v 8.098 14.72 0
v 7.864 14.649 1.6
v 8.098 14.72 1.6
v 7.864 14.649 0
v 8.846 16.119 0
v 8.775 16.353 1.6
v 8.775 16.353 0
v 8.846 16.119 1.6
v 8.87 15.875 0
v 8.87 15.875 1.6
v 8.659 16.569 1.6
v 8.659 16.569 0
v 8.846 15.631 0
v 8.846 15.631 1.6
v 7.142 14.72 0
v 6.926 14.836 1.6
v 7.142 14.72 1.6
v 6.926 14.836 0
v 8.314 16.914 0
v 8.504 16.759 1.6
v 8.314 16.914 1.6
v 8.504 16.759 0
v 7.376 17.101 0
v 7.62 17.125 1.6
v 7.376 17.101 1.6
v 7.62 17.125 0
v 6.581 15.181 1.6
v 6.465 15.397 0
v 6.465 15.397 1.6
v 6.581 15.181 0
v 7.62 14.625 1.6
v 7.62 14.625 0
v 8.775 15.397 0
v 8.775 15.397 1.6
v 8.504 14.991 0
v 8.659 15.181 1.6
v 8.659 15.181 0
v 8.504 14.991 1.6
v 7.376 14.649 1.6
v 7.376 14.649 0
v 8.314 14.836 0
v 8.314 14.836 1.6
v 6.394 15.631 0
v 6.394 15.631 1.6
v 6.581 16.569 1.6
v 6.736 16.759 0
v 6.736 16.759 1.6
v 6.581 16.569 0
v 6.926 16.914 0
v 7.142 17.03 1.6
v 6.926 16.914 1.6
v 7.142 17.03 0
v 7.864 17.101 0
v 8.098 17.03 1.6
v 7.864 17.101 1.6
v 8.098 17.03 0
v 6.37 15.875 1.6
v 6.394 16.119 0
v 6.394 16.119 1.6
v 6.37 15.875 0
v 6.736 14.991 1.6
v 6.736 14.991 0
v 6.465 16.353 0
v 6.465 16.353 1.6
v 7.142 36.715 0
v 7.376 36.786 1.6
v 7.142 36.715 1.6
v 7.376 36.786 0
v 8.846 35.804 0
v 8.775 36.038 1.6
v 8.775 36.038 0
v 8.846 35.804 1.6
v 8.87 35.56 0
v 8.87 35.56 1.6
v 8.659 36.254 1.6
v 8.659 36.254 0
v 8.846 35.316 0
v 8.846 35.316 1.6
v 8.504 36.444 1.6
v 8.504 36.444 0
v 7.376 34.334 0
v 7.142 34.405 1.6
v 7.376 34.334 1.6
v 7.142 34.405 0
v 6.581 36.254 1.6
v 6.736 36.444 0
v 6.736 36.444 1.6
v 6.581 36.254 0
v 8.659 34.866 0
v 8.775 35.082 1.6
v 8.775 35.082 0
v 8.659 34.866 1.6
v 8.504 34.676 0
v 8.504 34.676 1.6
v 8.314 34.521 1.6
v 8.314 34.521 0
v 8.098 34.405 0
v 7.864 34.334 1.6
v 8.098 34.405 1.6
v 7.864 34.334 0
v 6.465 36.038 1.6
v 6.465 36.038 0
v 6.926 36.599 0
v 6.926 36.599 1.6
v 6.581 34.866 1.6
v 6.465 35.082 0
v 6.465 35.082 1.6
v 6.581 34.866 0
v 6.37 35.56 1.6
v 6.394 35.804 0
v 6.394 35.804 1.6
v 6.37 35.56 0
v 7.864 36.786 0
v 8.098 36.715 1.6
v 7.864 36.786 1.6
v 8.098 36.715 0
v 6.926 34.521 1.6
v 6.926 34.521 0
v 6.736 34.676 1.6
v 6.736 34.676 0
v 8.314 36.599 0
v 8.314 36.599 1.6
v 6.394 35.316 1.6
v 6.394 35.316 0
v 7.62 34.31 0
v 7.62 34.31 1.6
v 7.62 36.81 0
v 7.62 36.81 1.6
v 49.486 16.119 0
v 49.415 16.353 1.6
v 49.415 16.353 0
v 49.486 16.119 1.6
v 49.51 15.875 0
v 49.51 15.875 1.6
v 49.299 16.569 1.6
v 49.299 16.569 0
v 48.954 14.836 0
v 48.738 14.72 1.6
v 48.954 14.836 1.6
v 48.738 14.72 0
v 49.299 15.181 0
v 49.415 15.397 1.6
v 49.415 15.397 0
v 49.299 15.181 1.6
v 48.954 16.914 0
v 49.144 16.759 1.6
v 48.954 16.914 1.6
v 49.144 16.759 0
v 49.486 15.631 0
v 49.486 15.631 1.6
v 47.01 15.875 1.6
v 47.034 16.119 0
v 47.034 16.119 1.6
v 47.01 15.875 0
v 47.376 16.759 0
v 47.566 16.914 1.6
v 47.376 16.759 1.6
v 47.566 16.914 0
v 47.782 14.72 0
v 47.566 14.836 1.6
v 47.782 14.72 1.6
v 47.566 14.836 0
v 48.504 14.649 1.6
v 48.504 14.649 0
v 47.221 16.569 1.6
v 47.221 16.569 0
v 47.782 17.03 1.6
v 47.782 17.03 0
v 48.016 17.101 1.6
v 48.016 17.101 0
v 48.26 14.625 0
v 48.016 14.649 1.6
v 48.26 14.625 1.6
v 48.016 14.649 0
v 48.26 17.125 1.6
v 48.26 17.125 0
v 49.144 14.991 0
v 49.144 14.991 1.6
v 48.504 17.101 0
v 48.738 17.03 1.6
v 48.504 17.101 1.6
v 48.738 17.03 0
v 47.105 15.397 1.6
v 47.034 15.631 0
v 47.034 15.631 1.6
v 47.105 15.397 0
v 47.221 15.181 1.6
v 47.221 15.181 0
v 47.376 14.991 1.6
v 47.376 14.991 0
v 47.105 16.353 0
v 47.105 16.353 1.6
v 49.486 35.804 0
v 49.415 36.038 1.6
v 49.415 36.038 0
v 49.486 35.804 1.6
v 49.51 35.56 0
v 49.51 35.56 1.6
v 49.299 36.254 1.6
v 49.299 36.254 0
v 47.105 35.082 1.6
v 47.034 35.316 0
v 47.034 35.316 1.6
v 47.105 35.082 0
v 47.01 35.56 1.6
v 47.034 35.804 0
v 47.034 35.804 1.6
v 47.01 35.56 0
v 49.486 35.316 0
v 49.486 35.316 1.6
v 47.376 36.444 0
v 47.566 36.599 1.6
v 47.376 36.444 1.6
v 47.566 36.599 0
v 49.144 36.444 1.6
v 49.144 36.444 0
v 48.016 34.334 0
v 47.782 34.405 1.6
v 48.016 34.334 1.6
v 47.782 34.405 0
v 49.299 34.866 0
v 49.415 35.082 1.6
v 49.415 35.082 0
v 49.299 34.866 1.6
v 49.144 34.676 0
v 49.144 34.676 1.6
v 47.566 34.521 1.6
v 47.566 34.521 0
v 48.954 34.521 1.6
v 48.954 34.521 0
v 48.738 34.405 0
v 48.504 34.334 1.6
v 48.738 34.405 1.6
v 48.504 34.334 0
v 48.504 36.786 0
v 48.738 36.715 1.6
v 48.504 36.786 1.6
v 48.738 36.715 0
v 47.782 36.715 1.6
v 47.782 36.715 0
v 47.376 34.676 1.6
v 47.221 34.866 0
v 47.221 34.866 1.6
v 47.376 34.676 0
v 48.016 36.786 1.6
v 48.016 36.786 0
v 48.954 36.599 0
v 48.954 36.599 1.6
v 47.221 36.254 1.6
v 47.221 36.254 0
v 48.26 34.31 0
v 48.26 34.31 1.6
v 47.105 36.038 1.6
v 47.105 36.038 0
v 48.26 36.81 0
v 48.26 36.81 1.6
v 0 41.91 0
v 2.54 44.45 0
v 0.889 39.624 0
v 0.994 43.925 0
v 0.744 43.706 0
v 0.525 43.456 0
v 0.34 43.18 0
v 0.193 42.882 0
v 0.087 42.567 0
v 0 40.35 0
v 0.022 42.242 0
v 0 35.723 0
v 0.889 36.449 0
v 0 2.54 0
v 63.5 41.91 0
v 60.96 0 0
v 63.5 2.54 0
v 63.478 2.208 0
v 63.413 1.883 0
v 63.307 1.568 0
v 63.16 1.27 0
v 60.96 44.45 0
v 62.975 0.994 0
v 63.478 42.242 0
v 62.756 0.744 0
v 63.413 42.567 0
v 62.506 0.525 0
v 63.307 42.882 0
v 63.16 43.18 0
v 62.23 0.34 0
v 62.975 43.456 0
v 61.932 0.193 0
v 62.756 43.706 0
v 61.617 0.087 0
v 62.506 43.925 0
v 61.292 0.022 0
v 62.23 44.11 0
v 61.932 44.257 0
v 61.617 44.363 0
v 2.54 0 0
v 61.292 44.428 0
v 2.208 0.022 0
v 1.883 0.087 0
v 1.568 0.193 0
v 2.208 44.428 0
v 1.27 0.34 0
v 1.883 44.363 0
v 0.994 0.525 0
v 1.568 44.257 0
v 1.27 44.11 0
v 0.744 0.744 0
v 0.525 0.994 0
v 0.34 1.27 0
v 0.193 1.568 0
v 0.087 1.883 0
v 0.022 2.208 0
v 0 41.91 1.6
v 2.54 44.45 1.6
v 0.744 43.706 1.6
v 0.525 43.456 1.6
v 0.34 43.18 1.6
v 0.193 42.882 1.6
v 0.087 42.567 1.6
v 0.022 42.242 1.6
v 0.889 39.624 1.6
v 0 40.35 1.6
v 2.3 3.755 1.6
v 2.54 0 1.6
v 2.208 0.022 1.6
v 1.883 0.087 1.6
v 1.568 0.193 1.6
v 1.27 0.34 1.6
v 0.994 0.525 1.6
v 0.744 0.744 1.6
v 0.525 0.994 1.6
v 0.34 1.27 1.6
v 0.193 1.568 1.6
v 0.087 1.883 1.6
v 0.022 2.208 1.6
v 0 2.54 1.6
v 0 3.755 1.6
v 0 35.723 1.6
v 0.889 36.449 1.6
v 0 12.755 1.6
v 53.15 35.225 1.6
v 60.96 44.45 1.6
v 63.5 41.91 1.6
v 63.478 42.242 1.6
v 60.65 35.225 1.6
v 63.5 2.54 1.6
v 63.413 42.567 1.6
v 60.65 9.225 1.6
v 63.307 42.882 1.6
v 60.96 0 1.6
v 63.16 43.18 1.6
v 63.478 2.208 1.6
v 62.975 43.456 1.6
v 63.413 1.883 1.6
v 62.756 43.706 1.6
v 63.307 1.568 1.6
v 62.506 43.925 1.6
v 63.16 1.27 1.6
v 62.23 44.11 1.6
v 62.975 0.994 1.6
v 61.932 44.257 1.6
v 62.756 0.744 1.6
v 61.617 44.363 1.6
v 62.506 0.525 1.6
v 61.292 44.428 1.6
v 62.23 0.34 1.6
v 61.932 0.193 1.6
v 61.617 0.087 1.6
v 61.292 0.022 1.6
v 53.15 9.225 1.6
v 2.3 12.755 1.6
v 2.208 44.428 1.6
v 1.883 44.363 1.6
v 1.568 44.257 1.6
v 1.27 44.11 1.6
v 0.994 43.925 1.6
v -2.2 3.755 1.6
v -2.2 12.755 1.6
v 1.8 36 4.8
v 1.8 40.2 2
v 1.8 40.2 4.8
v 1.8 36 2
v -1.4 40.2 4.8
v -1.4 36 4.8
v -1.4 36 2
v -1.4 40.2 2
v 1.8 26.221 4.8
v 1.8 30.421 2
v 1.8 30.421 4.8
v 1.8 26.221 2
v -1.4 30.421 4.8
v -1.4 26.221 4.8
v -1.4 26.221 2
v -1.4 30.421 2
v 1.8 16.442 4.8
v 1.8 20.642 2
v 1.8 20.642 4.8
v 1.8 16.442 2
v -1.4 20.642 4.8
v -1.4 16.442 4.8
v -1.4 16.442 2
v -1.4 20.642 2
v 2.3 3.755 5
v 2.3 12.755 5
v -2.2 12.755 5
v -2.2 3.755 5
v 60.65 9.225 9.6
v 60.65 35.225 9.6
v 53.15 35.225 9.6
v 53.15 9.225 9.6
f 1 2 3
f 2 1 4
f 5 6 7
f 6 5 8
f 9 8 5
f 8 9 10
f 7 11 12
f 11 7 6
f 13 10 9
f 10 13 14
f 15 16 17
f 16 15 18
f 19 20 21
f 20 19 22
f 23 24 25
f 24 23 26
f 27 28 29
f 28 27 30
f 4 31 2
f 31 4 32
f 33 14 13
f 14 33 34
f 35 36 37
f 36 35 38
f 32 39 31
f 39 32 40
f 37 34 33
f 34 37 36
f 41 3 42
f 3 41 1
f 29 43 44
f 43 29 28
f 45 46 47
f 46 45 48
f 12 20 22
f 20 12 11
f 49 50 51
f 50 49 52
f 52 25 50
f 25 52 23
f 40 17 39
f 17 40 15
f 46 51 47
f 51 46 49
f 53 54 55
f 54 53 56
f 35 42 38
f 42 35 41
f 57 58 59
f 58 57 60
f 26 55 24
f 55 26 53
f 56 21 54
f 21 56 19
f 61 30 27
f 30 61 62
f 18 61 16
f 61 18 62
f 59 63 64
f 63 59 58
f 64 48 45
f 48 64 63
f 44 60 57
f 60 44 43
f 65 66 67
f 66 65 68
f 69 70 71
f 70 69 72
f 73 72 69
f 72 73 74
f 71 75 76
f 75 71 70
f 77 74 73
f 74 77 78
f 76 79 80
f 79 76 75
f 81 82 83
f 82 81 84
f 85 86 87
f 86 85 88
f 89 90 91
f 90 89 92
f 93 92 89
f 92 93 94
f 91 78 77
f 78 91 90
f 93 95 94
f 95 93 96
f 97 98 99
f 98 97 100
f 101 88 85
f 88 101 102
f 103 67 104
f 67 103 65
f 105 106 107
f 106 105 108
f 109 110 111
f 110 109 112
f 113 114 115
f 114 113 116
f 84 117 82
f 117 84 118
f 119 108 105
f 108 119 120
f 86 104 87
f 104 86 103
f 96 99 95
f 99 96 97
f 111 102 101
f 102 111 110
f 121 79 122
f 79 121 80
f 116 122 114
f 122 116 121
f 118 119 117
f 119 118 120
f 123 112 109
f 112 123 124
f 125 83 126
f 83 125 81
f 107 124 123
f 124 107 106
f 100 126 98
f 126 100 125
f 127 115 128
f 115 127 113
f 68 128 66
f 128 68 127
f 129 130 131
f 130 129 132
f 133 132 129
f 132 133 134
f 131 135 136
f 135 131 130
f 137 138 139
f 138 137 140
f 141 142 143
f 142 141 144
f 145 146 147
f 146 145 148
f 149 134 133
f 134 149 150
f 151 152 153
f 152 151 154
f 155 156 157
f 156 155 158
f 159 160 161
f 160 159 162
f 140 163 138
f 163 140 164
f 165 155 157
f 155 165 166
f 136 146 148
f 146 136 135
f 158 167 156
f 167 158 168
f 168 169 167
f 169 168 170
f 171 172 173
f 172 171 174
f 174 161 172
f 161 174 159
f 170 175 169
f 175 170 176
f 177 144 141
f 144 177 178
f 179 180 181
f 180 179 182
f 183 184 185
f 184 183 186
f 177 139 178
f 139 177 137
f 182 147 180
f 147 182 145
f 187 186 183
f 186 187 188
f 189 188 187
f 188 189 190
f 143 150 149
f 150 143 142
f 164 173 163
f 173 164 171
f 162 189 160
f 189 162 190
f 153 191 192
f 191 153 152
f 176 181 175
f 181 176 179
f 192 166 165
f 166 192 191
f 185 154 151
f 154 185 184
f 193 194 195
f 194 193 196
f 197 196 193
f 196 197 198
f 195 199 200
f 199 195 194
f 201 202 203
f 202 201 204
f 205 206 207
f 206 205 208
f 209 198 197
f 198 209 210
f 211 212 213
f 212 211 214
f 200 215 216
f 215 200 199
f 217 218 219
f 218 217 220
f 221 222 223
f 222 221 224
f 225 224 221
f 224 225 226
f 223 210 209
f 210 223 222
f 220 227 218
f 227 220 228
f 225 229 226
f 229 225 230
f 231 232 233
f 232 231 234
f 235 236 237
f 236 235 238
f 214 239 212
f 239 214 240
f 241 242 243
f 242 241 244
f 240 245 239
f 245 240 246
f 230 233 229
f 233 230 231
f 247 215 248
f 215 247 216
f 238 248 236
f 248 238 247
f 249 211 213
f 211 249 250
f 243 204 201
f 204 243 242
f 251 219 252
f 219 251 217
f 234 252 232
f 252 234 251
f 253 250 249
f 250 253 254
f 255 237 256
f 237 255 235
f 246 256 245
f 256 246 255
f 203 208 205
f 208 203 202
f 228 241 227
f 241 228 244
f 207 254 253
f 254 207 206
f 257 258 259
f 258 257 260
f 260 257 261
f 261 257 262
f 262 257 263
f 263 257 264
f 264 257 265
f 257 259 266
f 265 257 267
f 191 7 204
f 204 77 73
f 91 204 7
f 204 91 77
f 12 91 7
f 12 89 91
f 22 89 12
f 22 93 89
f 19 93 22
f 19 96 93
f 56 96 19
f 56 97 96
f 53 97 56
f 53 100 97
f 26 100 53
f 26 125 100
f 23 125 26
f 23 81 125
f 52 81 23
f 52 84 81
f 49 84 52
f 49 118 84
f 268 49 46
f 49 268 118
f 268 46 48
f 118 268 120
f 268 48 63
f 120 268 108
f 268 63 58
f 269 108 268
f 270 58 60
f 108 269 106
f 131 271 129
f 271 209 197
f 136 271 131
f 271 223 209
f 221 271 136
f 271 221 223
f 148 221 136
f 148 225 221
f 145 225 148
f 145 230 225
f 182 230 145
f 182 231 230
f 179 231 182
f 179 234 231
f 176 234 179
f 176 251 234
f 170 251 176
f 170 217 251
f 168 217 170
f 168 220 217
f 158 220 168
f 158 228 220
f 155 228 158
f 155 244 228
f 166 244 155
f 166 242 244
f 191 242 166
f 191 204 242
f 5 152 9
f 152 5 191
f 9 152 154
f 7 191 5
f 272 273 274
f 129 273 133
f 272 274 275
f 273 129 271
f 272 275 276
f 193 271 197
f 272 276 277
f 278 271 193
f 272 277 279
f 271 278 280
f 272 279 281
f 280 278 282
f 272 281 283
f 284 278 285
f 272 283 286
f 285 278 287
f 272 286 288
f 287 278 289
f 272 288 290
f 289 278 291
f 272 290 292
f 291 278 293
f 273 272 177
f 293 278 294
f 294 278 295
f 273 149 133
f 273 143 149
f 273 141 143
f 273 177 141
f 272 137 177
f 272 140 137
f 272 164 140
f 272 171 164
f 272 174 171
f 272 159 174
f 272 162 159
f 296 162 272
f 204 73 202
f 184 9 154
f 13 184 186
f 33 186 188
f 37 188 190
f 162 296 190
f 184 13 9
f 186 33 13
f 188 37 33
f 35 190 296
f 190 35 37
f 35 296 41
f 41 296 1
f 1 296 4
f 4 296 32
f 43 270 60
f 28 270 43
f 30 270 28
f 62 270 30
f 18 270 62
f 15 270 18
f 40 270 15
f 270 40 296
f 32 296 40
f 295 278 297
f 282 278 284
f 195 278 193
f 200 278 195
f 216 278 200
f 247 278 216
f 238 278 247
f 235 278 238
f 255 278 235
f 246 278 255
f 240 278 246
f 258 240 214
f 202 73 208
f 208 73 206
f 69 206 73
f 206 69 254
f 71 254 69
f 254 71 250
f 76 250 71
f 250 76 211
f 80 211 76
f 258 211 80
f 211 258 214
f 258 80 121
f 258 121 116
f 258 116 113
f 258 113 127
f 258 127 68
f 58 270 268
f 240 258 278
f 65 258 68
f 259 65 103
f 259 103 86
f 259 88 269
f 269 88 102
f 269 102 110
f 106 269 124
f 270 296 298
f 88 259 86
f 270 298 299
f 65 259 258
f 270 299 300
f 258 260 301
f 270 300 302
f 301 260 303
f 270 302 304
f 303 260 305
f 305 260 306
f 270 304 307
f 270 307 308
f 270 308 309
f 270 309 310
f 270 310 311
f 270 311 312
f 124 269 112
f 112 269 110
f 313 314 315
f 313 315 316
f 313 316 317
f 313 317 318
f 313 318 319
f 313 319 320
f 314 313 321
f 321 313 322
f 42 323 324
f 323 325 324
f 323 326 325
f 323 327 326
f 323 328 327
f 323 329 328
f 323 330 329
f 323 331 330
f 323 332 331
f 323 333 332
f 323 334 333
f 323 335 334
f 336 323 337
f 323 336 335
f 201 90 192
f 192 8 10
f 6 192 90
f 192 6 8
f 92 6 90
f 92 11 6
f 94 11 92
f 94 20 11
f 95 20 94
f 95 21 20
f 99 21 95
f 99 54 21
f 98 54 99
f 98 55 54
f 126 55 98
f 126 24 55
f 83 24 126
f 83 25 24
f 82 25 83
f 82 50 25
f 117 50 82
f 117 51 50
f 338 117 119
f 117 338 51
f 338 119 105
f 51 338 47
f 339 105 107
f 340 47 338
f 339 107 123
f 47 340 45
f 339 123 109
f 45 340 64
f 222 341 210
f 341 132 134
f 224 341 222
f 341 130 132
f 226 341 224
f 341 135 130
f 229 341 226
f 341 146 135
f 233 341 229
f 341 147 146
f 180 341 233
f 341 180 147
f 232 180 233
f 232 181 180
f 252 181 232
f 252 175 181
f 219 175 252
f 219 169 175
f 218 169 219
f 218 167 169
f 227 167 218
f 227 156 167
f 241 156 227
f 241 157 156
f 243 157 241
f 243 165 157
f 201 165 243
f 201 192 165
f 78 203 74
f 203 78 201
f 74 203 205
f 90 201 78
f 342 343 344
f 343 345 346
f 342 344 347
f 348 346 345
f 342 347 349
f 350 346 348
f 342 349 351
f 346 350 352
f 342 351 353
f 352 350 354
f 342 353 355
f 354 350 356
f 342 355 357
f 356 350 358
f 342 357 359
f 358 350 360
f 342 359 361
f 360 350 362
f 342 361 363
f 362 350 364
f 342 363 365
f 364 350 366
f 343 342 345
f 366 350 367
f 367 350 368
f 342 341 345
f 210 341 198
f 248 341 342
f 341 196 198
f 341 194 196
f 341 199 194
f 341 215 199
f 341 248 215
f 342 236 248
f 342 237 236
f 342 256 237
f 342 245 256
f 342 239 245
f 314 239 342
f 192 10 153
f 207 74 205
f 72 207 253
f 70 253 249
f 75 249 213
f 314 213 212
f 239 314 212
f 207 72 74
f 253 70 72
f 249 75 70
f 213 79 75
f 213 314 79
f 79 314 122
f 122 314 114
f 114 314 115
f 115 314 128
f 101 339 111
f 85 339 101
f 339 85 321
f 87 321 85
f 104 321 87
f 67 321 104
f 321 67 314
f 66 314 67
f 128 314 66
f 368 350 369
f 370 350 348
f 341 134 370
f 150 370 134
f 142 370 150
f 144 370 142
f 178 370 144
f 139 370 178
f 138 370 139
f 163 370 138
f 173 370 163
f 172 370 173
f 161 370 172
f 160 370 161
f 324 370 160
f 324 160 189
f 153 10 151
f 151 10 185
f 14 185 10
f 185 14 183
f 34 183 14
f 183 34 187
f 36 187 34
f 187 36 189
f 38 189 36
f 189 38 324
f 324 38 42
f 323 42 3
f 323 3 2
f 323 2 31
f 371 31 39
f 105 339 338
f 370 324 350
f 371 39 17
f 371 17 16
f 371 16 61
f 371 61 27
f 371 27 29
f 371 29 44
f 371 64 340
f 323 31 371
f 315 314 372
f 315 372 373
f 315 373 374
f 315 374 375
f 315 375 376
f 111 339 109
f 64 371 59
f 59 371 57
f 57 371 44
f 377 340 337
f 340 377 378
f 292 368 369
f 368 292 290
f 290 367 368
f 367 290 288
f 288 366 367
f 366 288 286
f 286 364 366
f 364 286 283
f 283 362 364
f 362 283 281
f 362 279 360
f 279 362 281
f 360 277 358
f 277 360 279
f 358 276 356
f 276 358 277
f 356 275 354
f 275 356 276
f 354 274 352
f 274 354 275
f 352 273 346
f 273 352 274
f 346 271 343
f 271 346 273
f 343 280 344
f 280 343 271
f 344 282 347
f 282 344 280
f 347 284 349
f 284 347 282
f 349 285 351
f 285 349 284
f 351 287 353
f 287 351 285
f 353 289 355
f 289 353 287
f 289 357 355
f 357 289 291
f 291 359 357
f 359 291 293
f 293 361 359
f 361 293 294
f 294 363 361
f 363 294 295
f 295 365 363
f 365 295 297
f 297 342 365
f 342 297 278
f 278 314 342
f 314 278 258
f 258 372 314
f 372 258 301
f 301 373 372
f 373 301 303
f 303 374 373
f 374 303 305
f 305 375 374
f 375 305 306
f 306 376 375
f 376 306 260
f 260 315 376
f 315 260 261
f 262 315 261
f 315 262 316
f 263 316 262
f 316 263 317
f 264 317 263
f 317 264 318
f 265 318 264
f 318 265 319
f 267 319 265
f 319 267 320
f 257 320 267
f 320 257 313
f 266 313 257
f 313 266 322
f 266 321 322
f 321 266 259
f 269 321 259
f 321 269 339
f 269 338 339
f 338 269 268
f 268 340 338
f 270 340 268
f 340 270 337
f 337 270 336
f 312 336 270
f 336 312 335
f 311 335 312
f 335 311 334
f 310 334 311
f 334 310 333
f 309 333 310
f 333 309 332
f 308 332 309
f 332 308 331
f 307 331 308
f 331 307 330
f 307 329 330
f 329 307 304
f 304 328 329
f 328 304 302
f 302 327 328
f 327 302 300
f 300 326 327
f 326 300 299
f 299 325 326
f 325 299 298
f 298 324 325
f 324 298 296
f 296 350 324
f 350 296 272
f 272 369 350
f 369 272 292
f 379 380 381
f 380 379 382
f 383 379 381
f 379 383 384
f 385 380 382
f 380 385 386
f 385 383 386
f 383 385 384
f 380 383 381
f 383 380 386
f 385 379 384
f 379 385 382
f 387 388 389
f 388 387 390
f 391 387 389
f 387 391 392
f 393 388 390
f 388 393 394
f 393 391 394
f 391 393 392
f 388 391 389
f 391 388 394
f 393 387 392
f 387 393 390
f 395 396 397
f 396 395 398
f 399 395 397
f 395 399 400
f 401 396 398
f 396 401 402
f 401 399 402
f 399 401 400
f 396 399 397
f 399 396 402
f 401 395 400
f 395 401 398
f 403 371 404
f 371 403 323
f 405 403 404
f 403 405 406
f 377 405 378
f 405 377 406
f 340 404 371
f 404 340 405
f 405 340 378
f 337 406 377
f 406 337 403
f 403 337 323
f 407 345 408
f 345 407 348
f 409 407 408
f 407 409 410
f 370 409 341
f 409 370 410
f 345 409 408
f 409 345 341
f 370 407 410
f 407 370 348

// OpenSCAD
include <../matrixportal/matrixportal_s3_mount.scad>;

// Official Eagle-derived mechanical reference. This is not a printable part.
matrixportal_s3_reference(true);
